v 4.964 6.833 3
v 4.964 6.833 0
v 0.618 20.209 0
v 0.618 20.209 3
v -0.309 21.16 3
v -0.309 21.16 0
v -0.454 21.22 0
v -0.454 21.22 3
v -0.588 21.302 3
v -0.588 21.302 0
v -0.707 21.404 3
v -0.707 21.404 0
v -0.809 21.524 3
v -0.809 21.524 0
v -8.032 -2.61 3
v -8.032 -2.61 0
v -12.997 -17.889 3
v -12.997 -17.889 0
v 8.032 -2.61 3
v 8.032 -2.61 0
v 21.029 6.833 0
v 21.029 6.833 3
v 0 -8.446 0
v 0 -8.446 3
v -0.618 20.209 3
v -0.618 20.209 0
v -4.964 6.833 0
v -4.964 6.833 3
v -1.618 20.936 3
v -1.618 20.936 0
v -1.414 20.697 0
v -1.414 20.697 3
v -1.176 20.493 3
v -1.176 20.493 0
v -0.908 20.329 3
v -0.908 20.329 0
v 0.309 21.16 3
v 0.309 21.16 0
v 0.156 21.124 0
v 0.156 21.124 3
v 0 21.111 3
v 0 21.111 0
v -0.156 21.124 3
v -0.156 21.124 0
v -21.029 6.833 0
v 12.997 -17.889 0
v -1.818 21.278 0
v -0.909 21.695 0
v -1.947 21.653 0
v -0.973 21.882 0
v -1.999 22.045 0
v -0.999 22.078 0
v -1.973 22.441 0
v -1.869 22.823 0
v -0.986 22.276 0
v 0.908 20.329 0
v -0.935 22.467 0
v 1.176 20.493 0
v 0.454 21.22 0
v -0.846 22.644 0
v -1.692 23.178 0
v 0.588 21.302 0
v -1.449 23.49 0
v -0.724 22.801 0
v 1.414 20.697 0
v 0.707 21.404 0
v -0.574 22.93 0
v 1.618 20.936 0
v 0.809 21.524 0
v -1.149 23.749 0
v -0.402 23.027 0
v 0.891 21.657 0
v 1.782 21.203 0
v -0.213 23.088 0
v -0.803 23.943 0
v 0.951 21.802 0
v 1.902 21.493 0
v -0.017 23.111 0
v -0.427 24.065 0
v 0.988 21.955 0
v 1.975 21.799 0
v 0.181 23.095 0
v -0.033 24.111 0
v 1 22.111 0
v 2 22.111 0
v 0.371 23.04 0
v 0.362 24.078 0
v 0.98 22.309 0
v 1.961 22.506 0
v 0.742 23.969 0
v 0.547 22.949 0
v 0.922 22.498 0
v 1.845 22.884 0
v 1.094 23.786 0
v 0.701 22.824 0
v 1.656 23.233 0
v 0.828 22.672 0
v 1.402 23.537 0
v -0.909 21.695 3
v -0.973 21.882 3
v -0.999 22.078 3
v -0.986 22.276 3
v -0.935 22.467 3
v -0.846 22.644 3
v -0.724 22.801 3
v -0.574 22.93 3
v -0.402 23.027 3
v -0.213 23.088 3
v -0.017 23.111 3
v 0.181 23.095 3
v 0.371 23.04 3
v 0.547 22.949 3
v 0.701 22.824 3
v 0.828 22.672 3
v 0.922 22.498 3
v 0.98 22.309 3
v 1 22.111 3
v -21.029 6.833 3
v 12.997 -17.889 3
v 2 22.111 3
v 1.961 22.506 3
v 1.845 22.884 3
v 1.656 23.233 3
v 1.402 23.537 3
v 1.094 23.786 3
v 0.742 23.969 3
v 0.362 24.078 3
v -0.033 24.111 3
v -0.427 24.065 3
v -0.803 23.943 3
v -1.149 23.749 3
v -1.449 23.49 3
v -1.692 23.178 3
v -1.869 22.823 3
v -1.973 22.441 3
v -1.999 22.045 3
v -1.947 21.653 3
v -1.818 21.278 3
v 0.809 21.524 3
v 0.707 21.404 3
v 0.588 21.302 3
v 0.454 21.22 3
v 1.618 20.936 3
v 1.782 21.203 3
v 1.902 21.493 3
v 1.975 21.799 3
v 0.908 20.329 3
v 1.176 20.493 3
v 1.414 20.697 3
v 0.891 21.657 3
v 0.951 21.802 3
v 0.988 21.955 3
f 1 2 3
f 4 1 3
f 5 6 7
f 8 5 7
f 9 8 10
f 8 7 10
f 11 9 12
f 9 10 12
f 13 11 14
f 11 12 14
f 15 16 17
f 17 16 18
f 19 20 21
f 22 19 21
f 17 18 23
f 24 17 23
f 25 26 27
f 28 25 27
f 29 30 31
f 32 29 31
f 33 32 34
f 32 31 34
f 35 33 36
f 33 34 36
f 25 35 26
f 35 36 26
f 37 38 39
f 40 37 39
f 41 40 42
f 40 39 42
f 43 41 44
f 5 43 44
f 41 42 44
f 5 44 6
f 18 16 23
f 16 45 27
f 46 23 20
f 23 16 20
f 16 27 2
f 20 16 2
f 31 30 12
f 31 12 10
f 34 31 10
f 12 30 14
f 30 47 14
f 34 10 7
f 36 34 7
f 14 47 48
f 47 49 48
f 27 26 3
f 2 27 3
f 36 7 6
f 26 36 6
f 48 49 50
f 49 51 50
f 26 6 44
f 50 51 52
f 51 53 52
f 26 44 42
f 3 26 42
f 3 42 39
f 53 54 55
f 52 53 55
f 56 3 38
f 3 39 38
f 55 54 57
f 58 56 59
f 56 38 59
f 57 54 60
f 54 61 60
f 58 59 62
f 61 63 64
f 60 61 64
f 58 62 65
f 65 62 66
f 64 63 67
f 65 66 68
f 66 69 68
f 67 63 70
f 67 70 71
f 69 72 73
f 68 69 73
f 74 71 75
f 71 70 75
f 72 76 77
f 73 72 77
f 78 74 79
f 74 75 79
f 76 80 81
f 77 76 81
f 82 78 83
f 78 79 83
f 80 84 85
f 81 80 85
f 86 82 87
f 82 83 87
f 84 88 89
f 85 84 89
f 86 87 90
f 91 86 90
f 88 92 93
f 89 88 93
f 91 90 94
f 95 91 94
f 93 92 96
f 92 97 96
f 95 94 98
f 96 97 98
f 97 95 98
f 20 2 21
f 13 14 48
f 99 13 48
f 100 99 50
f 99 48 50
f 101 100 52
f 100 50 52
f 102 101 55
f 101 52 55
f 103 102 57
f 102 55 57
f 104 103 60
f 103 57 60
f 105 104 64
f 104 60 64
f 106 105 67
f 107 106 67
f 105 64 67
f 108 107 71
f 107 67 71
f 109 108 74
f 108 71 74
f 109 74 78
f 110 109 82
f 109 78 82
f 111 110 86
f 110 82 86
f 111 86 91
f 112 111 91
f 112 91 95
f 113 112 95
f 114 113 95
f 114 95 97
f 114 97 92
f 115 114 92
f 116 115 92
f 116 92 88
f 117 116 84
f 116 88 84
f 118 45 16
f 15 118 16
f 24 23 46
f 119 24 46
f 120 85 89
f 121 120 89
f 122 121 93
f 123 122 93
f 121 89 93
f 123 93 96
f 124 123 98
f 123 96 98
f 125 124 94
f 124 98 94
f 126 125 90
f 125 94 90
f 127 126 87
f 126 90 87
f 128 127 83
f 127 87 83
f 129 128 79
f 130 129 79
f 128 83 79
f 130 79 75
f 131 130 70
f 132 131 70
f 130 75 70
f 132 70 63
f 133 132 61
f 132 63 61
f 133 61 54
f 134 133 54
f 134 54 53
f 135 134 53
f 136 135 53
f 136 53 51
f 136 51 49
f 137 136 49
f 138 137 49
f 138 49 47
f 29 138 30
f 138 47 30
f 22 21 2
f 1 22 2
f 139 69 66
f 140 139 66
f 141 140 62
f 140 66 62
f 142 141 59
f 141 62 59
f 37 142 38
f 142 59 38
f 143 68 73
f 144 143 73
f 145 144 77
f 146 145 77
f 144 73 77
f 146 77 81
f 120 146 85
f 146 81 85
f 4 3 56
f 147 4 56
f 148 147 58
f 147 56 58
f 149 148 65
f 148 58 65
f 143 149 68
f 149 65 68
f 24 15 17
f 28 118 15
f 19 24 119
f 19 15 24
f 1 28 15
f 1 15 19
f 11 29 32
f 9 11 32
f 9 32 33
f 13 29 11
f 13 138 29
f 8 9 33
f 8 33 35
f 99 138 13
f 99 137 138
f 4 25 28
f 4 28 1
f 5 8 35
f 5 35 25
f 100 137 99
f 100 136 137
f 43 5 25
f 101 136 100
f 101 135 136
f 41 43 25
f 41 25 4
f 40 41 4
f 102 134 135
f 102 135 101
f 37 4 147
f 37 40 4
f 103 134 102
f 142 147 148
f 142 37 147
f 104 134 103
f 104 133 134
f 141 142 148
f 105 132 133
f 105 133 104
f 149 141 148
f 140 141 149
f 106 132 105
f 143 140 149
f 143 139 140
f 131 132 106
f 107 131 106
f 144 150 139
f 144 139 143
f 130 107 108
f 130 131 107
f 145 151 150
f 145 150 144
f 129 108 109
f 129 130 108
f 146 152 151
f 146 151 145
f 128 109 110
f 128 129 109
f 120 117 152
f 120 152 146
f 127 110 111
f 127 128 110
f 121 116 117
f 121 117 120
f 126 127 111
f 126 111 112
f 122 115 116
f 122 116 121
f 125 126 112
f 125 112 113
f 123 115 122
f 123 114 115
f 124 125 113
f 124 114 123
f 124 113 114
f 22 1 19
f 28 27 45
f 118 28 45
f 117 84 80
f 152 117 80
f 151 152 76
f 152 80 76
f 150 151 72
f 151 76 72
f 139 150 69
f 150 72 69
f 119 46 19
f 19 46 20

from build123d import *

# Parameters (mm, degrees)
F1_DEPTH = 3


# Not quite as in the source:
# - a feature names something its author has since deleted; it is built from what else it names


with BuildPart() as f1:
    # F0 (on Top) → F1 (new body)
    with BuildSketch(Plane.XY):
        with BuildLine():
            ThreePointArc((0.6180339887, 20.2093431474), (0, 20.11145618), (-0.6180339887, 20.2093431474))
            Line((-0.6180339887, 20.2093431474), (-4.9643312139, 6.83281573))
            Line((-4.9643312139, 6.83281573), (-21.0292444848, 6.83281573))
            Line((-21.0292444848, 6.83281573), (-8.0324566354, -2.60990337))
            Line((-8.0324566354, -2.60990337), (-12.9967878493, -17.88854382))
            Line((-12.9967878493, -17.88854382), (0, -8.44582472))
            Line((0, -8.44582472), (12.9967878493, -17.88854382))
            Line((12.9967878493, -17.88854382), (8.0324566354, -2.60990337))
            Line((8.0324566354, -2.60990337), (21.0292444848, 6.83281573))
            Line((21.0292444848, 6.83281573), (4.9643312139, 6.83281573))
            Line((4.9643312139, 6.83281573), (0.6180339887, 20.2093431474))
        make_face()
        with BuildLine():
            ThreePointArc((0.3090169944, 21.1603996637), (0, 21.11145618), (-0.3090169944, 21.1603996637))
            Line((-0.3090169944, 21.1603996637), (-0.6180339887, 20.2093431474))
            ThreePointArc((-0.6180339887, 20.2093431474), (0, 20.11145618), (0.6180339887, 20.2093431474))
            Line((0.6180339887, 20.2093431474), (0.3090169944, 21.1603996637))
        make_face()
        with BuildLine():
            Line((1.6180339887, 20.9358856754), (0.8090169944, 21.5236709277))
            ThreePointArc((0.8090169944, 21.5236709277), (0.5877852523, 21.3024391856), (0.3090169944, 21.1603996637))
            Line((0.3090169944, 21.1603996637), (0.6180339887, 20.2093431474))
            ThreePointArc((0.6180339887, 20.2093431474), (1.1755705046, 20.4934221913), (1.6180339887, 20.9358856754))
        make_face()
        with BuildLine():
            ThreePointArc((1, 22.11145618), (0.9510565163, 21.8024391856), (0.8090169944, 21.5236709277))
            Line((0.8090169944, 21.5236709277), (1.6180339887, 20.9358856754))
            ThreePointArc((1.6180339887, 20.9358856754), (1.9021130326, 21.4934221913), (2, 22.11145618))
            ThreePointArc((2, 22.11145618), (-0.6180339887, 24.0135692126), (-1.6180339887, 20.9358856754))
            Line((-1.6180339887, 20.9358856754), (-0.8090169944, 21.5236709277))
            ThreePointArc((-0.8090169944, 21.5236709277), (-0.3090169944, 23.0625126963), (1, 22.11145618))
        make_face()
        with BuildLine():
            ThreePointArc((-0.3090169944, 21.1603996637), (-0.5877852523, 21.3024391856), (-0.8090169944, 21.5236709277))
            Line((-0.8090169944, 21.5236709277), (-1.6180339887, 20.9358856754))
            ThreePointArc((-1.6180339887, 20.9358856754), (-1.1755705046, 20.4934221913), (-0.6180339887, 20.2093431474))
            Line((-0.6180339887, 20.2093431474), (-0.3090169944, 21.1603996637))
        make_face()
    extrude(amount=F1_DEPTH)


solid = f1.part
